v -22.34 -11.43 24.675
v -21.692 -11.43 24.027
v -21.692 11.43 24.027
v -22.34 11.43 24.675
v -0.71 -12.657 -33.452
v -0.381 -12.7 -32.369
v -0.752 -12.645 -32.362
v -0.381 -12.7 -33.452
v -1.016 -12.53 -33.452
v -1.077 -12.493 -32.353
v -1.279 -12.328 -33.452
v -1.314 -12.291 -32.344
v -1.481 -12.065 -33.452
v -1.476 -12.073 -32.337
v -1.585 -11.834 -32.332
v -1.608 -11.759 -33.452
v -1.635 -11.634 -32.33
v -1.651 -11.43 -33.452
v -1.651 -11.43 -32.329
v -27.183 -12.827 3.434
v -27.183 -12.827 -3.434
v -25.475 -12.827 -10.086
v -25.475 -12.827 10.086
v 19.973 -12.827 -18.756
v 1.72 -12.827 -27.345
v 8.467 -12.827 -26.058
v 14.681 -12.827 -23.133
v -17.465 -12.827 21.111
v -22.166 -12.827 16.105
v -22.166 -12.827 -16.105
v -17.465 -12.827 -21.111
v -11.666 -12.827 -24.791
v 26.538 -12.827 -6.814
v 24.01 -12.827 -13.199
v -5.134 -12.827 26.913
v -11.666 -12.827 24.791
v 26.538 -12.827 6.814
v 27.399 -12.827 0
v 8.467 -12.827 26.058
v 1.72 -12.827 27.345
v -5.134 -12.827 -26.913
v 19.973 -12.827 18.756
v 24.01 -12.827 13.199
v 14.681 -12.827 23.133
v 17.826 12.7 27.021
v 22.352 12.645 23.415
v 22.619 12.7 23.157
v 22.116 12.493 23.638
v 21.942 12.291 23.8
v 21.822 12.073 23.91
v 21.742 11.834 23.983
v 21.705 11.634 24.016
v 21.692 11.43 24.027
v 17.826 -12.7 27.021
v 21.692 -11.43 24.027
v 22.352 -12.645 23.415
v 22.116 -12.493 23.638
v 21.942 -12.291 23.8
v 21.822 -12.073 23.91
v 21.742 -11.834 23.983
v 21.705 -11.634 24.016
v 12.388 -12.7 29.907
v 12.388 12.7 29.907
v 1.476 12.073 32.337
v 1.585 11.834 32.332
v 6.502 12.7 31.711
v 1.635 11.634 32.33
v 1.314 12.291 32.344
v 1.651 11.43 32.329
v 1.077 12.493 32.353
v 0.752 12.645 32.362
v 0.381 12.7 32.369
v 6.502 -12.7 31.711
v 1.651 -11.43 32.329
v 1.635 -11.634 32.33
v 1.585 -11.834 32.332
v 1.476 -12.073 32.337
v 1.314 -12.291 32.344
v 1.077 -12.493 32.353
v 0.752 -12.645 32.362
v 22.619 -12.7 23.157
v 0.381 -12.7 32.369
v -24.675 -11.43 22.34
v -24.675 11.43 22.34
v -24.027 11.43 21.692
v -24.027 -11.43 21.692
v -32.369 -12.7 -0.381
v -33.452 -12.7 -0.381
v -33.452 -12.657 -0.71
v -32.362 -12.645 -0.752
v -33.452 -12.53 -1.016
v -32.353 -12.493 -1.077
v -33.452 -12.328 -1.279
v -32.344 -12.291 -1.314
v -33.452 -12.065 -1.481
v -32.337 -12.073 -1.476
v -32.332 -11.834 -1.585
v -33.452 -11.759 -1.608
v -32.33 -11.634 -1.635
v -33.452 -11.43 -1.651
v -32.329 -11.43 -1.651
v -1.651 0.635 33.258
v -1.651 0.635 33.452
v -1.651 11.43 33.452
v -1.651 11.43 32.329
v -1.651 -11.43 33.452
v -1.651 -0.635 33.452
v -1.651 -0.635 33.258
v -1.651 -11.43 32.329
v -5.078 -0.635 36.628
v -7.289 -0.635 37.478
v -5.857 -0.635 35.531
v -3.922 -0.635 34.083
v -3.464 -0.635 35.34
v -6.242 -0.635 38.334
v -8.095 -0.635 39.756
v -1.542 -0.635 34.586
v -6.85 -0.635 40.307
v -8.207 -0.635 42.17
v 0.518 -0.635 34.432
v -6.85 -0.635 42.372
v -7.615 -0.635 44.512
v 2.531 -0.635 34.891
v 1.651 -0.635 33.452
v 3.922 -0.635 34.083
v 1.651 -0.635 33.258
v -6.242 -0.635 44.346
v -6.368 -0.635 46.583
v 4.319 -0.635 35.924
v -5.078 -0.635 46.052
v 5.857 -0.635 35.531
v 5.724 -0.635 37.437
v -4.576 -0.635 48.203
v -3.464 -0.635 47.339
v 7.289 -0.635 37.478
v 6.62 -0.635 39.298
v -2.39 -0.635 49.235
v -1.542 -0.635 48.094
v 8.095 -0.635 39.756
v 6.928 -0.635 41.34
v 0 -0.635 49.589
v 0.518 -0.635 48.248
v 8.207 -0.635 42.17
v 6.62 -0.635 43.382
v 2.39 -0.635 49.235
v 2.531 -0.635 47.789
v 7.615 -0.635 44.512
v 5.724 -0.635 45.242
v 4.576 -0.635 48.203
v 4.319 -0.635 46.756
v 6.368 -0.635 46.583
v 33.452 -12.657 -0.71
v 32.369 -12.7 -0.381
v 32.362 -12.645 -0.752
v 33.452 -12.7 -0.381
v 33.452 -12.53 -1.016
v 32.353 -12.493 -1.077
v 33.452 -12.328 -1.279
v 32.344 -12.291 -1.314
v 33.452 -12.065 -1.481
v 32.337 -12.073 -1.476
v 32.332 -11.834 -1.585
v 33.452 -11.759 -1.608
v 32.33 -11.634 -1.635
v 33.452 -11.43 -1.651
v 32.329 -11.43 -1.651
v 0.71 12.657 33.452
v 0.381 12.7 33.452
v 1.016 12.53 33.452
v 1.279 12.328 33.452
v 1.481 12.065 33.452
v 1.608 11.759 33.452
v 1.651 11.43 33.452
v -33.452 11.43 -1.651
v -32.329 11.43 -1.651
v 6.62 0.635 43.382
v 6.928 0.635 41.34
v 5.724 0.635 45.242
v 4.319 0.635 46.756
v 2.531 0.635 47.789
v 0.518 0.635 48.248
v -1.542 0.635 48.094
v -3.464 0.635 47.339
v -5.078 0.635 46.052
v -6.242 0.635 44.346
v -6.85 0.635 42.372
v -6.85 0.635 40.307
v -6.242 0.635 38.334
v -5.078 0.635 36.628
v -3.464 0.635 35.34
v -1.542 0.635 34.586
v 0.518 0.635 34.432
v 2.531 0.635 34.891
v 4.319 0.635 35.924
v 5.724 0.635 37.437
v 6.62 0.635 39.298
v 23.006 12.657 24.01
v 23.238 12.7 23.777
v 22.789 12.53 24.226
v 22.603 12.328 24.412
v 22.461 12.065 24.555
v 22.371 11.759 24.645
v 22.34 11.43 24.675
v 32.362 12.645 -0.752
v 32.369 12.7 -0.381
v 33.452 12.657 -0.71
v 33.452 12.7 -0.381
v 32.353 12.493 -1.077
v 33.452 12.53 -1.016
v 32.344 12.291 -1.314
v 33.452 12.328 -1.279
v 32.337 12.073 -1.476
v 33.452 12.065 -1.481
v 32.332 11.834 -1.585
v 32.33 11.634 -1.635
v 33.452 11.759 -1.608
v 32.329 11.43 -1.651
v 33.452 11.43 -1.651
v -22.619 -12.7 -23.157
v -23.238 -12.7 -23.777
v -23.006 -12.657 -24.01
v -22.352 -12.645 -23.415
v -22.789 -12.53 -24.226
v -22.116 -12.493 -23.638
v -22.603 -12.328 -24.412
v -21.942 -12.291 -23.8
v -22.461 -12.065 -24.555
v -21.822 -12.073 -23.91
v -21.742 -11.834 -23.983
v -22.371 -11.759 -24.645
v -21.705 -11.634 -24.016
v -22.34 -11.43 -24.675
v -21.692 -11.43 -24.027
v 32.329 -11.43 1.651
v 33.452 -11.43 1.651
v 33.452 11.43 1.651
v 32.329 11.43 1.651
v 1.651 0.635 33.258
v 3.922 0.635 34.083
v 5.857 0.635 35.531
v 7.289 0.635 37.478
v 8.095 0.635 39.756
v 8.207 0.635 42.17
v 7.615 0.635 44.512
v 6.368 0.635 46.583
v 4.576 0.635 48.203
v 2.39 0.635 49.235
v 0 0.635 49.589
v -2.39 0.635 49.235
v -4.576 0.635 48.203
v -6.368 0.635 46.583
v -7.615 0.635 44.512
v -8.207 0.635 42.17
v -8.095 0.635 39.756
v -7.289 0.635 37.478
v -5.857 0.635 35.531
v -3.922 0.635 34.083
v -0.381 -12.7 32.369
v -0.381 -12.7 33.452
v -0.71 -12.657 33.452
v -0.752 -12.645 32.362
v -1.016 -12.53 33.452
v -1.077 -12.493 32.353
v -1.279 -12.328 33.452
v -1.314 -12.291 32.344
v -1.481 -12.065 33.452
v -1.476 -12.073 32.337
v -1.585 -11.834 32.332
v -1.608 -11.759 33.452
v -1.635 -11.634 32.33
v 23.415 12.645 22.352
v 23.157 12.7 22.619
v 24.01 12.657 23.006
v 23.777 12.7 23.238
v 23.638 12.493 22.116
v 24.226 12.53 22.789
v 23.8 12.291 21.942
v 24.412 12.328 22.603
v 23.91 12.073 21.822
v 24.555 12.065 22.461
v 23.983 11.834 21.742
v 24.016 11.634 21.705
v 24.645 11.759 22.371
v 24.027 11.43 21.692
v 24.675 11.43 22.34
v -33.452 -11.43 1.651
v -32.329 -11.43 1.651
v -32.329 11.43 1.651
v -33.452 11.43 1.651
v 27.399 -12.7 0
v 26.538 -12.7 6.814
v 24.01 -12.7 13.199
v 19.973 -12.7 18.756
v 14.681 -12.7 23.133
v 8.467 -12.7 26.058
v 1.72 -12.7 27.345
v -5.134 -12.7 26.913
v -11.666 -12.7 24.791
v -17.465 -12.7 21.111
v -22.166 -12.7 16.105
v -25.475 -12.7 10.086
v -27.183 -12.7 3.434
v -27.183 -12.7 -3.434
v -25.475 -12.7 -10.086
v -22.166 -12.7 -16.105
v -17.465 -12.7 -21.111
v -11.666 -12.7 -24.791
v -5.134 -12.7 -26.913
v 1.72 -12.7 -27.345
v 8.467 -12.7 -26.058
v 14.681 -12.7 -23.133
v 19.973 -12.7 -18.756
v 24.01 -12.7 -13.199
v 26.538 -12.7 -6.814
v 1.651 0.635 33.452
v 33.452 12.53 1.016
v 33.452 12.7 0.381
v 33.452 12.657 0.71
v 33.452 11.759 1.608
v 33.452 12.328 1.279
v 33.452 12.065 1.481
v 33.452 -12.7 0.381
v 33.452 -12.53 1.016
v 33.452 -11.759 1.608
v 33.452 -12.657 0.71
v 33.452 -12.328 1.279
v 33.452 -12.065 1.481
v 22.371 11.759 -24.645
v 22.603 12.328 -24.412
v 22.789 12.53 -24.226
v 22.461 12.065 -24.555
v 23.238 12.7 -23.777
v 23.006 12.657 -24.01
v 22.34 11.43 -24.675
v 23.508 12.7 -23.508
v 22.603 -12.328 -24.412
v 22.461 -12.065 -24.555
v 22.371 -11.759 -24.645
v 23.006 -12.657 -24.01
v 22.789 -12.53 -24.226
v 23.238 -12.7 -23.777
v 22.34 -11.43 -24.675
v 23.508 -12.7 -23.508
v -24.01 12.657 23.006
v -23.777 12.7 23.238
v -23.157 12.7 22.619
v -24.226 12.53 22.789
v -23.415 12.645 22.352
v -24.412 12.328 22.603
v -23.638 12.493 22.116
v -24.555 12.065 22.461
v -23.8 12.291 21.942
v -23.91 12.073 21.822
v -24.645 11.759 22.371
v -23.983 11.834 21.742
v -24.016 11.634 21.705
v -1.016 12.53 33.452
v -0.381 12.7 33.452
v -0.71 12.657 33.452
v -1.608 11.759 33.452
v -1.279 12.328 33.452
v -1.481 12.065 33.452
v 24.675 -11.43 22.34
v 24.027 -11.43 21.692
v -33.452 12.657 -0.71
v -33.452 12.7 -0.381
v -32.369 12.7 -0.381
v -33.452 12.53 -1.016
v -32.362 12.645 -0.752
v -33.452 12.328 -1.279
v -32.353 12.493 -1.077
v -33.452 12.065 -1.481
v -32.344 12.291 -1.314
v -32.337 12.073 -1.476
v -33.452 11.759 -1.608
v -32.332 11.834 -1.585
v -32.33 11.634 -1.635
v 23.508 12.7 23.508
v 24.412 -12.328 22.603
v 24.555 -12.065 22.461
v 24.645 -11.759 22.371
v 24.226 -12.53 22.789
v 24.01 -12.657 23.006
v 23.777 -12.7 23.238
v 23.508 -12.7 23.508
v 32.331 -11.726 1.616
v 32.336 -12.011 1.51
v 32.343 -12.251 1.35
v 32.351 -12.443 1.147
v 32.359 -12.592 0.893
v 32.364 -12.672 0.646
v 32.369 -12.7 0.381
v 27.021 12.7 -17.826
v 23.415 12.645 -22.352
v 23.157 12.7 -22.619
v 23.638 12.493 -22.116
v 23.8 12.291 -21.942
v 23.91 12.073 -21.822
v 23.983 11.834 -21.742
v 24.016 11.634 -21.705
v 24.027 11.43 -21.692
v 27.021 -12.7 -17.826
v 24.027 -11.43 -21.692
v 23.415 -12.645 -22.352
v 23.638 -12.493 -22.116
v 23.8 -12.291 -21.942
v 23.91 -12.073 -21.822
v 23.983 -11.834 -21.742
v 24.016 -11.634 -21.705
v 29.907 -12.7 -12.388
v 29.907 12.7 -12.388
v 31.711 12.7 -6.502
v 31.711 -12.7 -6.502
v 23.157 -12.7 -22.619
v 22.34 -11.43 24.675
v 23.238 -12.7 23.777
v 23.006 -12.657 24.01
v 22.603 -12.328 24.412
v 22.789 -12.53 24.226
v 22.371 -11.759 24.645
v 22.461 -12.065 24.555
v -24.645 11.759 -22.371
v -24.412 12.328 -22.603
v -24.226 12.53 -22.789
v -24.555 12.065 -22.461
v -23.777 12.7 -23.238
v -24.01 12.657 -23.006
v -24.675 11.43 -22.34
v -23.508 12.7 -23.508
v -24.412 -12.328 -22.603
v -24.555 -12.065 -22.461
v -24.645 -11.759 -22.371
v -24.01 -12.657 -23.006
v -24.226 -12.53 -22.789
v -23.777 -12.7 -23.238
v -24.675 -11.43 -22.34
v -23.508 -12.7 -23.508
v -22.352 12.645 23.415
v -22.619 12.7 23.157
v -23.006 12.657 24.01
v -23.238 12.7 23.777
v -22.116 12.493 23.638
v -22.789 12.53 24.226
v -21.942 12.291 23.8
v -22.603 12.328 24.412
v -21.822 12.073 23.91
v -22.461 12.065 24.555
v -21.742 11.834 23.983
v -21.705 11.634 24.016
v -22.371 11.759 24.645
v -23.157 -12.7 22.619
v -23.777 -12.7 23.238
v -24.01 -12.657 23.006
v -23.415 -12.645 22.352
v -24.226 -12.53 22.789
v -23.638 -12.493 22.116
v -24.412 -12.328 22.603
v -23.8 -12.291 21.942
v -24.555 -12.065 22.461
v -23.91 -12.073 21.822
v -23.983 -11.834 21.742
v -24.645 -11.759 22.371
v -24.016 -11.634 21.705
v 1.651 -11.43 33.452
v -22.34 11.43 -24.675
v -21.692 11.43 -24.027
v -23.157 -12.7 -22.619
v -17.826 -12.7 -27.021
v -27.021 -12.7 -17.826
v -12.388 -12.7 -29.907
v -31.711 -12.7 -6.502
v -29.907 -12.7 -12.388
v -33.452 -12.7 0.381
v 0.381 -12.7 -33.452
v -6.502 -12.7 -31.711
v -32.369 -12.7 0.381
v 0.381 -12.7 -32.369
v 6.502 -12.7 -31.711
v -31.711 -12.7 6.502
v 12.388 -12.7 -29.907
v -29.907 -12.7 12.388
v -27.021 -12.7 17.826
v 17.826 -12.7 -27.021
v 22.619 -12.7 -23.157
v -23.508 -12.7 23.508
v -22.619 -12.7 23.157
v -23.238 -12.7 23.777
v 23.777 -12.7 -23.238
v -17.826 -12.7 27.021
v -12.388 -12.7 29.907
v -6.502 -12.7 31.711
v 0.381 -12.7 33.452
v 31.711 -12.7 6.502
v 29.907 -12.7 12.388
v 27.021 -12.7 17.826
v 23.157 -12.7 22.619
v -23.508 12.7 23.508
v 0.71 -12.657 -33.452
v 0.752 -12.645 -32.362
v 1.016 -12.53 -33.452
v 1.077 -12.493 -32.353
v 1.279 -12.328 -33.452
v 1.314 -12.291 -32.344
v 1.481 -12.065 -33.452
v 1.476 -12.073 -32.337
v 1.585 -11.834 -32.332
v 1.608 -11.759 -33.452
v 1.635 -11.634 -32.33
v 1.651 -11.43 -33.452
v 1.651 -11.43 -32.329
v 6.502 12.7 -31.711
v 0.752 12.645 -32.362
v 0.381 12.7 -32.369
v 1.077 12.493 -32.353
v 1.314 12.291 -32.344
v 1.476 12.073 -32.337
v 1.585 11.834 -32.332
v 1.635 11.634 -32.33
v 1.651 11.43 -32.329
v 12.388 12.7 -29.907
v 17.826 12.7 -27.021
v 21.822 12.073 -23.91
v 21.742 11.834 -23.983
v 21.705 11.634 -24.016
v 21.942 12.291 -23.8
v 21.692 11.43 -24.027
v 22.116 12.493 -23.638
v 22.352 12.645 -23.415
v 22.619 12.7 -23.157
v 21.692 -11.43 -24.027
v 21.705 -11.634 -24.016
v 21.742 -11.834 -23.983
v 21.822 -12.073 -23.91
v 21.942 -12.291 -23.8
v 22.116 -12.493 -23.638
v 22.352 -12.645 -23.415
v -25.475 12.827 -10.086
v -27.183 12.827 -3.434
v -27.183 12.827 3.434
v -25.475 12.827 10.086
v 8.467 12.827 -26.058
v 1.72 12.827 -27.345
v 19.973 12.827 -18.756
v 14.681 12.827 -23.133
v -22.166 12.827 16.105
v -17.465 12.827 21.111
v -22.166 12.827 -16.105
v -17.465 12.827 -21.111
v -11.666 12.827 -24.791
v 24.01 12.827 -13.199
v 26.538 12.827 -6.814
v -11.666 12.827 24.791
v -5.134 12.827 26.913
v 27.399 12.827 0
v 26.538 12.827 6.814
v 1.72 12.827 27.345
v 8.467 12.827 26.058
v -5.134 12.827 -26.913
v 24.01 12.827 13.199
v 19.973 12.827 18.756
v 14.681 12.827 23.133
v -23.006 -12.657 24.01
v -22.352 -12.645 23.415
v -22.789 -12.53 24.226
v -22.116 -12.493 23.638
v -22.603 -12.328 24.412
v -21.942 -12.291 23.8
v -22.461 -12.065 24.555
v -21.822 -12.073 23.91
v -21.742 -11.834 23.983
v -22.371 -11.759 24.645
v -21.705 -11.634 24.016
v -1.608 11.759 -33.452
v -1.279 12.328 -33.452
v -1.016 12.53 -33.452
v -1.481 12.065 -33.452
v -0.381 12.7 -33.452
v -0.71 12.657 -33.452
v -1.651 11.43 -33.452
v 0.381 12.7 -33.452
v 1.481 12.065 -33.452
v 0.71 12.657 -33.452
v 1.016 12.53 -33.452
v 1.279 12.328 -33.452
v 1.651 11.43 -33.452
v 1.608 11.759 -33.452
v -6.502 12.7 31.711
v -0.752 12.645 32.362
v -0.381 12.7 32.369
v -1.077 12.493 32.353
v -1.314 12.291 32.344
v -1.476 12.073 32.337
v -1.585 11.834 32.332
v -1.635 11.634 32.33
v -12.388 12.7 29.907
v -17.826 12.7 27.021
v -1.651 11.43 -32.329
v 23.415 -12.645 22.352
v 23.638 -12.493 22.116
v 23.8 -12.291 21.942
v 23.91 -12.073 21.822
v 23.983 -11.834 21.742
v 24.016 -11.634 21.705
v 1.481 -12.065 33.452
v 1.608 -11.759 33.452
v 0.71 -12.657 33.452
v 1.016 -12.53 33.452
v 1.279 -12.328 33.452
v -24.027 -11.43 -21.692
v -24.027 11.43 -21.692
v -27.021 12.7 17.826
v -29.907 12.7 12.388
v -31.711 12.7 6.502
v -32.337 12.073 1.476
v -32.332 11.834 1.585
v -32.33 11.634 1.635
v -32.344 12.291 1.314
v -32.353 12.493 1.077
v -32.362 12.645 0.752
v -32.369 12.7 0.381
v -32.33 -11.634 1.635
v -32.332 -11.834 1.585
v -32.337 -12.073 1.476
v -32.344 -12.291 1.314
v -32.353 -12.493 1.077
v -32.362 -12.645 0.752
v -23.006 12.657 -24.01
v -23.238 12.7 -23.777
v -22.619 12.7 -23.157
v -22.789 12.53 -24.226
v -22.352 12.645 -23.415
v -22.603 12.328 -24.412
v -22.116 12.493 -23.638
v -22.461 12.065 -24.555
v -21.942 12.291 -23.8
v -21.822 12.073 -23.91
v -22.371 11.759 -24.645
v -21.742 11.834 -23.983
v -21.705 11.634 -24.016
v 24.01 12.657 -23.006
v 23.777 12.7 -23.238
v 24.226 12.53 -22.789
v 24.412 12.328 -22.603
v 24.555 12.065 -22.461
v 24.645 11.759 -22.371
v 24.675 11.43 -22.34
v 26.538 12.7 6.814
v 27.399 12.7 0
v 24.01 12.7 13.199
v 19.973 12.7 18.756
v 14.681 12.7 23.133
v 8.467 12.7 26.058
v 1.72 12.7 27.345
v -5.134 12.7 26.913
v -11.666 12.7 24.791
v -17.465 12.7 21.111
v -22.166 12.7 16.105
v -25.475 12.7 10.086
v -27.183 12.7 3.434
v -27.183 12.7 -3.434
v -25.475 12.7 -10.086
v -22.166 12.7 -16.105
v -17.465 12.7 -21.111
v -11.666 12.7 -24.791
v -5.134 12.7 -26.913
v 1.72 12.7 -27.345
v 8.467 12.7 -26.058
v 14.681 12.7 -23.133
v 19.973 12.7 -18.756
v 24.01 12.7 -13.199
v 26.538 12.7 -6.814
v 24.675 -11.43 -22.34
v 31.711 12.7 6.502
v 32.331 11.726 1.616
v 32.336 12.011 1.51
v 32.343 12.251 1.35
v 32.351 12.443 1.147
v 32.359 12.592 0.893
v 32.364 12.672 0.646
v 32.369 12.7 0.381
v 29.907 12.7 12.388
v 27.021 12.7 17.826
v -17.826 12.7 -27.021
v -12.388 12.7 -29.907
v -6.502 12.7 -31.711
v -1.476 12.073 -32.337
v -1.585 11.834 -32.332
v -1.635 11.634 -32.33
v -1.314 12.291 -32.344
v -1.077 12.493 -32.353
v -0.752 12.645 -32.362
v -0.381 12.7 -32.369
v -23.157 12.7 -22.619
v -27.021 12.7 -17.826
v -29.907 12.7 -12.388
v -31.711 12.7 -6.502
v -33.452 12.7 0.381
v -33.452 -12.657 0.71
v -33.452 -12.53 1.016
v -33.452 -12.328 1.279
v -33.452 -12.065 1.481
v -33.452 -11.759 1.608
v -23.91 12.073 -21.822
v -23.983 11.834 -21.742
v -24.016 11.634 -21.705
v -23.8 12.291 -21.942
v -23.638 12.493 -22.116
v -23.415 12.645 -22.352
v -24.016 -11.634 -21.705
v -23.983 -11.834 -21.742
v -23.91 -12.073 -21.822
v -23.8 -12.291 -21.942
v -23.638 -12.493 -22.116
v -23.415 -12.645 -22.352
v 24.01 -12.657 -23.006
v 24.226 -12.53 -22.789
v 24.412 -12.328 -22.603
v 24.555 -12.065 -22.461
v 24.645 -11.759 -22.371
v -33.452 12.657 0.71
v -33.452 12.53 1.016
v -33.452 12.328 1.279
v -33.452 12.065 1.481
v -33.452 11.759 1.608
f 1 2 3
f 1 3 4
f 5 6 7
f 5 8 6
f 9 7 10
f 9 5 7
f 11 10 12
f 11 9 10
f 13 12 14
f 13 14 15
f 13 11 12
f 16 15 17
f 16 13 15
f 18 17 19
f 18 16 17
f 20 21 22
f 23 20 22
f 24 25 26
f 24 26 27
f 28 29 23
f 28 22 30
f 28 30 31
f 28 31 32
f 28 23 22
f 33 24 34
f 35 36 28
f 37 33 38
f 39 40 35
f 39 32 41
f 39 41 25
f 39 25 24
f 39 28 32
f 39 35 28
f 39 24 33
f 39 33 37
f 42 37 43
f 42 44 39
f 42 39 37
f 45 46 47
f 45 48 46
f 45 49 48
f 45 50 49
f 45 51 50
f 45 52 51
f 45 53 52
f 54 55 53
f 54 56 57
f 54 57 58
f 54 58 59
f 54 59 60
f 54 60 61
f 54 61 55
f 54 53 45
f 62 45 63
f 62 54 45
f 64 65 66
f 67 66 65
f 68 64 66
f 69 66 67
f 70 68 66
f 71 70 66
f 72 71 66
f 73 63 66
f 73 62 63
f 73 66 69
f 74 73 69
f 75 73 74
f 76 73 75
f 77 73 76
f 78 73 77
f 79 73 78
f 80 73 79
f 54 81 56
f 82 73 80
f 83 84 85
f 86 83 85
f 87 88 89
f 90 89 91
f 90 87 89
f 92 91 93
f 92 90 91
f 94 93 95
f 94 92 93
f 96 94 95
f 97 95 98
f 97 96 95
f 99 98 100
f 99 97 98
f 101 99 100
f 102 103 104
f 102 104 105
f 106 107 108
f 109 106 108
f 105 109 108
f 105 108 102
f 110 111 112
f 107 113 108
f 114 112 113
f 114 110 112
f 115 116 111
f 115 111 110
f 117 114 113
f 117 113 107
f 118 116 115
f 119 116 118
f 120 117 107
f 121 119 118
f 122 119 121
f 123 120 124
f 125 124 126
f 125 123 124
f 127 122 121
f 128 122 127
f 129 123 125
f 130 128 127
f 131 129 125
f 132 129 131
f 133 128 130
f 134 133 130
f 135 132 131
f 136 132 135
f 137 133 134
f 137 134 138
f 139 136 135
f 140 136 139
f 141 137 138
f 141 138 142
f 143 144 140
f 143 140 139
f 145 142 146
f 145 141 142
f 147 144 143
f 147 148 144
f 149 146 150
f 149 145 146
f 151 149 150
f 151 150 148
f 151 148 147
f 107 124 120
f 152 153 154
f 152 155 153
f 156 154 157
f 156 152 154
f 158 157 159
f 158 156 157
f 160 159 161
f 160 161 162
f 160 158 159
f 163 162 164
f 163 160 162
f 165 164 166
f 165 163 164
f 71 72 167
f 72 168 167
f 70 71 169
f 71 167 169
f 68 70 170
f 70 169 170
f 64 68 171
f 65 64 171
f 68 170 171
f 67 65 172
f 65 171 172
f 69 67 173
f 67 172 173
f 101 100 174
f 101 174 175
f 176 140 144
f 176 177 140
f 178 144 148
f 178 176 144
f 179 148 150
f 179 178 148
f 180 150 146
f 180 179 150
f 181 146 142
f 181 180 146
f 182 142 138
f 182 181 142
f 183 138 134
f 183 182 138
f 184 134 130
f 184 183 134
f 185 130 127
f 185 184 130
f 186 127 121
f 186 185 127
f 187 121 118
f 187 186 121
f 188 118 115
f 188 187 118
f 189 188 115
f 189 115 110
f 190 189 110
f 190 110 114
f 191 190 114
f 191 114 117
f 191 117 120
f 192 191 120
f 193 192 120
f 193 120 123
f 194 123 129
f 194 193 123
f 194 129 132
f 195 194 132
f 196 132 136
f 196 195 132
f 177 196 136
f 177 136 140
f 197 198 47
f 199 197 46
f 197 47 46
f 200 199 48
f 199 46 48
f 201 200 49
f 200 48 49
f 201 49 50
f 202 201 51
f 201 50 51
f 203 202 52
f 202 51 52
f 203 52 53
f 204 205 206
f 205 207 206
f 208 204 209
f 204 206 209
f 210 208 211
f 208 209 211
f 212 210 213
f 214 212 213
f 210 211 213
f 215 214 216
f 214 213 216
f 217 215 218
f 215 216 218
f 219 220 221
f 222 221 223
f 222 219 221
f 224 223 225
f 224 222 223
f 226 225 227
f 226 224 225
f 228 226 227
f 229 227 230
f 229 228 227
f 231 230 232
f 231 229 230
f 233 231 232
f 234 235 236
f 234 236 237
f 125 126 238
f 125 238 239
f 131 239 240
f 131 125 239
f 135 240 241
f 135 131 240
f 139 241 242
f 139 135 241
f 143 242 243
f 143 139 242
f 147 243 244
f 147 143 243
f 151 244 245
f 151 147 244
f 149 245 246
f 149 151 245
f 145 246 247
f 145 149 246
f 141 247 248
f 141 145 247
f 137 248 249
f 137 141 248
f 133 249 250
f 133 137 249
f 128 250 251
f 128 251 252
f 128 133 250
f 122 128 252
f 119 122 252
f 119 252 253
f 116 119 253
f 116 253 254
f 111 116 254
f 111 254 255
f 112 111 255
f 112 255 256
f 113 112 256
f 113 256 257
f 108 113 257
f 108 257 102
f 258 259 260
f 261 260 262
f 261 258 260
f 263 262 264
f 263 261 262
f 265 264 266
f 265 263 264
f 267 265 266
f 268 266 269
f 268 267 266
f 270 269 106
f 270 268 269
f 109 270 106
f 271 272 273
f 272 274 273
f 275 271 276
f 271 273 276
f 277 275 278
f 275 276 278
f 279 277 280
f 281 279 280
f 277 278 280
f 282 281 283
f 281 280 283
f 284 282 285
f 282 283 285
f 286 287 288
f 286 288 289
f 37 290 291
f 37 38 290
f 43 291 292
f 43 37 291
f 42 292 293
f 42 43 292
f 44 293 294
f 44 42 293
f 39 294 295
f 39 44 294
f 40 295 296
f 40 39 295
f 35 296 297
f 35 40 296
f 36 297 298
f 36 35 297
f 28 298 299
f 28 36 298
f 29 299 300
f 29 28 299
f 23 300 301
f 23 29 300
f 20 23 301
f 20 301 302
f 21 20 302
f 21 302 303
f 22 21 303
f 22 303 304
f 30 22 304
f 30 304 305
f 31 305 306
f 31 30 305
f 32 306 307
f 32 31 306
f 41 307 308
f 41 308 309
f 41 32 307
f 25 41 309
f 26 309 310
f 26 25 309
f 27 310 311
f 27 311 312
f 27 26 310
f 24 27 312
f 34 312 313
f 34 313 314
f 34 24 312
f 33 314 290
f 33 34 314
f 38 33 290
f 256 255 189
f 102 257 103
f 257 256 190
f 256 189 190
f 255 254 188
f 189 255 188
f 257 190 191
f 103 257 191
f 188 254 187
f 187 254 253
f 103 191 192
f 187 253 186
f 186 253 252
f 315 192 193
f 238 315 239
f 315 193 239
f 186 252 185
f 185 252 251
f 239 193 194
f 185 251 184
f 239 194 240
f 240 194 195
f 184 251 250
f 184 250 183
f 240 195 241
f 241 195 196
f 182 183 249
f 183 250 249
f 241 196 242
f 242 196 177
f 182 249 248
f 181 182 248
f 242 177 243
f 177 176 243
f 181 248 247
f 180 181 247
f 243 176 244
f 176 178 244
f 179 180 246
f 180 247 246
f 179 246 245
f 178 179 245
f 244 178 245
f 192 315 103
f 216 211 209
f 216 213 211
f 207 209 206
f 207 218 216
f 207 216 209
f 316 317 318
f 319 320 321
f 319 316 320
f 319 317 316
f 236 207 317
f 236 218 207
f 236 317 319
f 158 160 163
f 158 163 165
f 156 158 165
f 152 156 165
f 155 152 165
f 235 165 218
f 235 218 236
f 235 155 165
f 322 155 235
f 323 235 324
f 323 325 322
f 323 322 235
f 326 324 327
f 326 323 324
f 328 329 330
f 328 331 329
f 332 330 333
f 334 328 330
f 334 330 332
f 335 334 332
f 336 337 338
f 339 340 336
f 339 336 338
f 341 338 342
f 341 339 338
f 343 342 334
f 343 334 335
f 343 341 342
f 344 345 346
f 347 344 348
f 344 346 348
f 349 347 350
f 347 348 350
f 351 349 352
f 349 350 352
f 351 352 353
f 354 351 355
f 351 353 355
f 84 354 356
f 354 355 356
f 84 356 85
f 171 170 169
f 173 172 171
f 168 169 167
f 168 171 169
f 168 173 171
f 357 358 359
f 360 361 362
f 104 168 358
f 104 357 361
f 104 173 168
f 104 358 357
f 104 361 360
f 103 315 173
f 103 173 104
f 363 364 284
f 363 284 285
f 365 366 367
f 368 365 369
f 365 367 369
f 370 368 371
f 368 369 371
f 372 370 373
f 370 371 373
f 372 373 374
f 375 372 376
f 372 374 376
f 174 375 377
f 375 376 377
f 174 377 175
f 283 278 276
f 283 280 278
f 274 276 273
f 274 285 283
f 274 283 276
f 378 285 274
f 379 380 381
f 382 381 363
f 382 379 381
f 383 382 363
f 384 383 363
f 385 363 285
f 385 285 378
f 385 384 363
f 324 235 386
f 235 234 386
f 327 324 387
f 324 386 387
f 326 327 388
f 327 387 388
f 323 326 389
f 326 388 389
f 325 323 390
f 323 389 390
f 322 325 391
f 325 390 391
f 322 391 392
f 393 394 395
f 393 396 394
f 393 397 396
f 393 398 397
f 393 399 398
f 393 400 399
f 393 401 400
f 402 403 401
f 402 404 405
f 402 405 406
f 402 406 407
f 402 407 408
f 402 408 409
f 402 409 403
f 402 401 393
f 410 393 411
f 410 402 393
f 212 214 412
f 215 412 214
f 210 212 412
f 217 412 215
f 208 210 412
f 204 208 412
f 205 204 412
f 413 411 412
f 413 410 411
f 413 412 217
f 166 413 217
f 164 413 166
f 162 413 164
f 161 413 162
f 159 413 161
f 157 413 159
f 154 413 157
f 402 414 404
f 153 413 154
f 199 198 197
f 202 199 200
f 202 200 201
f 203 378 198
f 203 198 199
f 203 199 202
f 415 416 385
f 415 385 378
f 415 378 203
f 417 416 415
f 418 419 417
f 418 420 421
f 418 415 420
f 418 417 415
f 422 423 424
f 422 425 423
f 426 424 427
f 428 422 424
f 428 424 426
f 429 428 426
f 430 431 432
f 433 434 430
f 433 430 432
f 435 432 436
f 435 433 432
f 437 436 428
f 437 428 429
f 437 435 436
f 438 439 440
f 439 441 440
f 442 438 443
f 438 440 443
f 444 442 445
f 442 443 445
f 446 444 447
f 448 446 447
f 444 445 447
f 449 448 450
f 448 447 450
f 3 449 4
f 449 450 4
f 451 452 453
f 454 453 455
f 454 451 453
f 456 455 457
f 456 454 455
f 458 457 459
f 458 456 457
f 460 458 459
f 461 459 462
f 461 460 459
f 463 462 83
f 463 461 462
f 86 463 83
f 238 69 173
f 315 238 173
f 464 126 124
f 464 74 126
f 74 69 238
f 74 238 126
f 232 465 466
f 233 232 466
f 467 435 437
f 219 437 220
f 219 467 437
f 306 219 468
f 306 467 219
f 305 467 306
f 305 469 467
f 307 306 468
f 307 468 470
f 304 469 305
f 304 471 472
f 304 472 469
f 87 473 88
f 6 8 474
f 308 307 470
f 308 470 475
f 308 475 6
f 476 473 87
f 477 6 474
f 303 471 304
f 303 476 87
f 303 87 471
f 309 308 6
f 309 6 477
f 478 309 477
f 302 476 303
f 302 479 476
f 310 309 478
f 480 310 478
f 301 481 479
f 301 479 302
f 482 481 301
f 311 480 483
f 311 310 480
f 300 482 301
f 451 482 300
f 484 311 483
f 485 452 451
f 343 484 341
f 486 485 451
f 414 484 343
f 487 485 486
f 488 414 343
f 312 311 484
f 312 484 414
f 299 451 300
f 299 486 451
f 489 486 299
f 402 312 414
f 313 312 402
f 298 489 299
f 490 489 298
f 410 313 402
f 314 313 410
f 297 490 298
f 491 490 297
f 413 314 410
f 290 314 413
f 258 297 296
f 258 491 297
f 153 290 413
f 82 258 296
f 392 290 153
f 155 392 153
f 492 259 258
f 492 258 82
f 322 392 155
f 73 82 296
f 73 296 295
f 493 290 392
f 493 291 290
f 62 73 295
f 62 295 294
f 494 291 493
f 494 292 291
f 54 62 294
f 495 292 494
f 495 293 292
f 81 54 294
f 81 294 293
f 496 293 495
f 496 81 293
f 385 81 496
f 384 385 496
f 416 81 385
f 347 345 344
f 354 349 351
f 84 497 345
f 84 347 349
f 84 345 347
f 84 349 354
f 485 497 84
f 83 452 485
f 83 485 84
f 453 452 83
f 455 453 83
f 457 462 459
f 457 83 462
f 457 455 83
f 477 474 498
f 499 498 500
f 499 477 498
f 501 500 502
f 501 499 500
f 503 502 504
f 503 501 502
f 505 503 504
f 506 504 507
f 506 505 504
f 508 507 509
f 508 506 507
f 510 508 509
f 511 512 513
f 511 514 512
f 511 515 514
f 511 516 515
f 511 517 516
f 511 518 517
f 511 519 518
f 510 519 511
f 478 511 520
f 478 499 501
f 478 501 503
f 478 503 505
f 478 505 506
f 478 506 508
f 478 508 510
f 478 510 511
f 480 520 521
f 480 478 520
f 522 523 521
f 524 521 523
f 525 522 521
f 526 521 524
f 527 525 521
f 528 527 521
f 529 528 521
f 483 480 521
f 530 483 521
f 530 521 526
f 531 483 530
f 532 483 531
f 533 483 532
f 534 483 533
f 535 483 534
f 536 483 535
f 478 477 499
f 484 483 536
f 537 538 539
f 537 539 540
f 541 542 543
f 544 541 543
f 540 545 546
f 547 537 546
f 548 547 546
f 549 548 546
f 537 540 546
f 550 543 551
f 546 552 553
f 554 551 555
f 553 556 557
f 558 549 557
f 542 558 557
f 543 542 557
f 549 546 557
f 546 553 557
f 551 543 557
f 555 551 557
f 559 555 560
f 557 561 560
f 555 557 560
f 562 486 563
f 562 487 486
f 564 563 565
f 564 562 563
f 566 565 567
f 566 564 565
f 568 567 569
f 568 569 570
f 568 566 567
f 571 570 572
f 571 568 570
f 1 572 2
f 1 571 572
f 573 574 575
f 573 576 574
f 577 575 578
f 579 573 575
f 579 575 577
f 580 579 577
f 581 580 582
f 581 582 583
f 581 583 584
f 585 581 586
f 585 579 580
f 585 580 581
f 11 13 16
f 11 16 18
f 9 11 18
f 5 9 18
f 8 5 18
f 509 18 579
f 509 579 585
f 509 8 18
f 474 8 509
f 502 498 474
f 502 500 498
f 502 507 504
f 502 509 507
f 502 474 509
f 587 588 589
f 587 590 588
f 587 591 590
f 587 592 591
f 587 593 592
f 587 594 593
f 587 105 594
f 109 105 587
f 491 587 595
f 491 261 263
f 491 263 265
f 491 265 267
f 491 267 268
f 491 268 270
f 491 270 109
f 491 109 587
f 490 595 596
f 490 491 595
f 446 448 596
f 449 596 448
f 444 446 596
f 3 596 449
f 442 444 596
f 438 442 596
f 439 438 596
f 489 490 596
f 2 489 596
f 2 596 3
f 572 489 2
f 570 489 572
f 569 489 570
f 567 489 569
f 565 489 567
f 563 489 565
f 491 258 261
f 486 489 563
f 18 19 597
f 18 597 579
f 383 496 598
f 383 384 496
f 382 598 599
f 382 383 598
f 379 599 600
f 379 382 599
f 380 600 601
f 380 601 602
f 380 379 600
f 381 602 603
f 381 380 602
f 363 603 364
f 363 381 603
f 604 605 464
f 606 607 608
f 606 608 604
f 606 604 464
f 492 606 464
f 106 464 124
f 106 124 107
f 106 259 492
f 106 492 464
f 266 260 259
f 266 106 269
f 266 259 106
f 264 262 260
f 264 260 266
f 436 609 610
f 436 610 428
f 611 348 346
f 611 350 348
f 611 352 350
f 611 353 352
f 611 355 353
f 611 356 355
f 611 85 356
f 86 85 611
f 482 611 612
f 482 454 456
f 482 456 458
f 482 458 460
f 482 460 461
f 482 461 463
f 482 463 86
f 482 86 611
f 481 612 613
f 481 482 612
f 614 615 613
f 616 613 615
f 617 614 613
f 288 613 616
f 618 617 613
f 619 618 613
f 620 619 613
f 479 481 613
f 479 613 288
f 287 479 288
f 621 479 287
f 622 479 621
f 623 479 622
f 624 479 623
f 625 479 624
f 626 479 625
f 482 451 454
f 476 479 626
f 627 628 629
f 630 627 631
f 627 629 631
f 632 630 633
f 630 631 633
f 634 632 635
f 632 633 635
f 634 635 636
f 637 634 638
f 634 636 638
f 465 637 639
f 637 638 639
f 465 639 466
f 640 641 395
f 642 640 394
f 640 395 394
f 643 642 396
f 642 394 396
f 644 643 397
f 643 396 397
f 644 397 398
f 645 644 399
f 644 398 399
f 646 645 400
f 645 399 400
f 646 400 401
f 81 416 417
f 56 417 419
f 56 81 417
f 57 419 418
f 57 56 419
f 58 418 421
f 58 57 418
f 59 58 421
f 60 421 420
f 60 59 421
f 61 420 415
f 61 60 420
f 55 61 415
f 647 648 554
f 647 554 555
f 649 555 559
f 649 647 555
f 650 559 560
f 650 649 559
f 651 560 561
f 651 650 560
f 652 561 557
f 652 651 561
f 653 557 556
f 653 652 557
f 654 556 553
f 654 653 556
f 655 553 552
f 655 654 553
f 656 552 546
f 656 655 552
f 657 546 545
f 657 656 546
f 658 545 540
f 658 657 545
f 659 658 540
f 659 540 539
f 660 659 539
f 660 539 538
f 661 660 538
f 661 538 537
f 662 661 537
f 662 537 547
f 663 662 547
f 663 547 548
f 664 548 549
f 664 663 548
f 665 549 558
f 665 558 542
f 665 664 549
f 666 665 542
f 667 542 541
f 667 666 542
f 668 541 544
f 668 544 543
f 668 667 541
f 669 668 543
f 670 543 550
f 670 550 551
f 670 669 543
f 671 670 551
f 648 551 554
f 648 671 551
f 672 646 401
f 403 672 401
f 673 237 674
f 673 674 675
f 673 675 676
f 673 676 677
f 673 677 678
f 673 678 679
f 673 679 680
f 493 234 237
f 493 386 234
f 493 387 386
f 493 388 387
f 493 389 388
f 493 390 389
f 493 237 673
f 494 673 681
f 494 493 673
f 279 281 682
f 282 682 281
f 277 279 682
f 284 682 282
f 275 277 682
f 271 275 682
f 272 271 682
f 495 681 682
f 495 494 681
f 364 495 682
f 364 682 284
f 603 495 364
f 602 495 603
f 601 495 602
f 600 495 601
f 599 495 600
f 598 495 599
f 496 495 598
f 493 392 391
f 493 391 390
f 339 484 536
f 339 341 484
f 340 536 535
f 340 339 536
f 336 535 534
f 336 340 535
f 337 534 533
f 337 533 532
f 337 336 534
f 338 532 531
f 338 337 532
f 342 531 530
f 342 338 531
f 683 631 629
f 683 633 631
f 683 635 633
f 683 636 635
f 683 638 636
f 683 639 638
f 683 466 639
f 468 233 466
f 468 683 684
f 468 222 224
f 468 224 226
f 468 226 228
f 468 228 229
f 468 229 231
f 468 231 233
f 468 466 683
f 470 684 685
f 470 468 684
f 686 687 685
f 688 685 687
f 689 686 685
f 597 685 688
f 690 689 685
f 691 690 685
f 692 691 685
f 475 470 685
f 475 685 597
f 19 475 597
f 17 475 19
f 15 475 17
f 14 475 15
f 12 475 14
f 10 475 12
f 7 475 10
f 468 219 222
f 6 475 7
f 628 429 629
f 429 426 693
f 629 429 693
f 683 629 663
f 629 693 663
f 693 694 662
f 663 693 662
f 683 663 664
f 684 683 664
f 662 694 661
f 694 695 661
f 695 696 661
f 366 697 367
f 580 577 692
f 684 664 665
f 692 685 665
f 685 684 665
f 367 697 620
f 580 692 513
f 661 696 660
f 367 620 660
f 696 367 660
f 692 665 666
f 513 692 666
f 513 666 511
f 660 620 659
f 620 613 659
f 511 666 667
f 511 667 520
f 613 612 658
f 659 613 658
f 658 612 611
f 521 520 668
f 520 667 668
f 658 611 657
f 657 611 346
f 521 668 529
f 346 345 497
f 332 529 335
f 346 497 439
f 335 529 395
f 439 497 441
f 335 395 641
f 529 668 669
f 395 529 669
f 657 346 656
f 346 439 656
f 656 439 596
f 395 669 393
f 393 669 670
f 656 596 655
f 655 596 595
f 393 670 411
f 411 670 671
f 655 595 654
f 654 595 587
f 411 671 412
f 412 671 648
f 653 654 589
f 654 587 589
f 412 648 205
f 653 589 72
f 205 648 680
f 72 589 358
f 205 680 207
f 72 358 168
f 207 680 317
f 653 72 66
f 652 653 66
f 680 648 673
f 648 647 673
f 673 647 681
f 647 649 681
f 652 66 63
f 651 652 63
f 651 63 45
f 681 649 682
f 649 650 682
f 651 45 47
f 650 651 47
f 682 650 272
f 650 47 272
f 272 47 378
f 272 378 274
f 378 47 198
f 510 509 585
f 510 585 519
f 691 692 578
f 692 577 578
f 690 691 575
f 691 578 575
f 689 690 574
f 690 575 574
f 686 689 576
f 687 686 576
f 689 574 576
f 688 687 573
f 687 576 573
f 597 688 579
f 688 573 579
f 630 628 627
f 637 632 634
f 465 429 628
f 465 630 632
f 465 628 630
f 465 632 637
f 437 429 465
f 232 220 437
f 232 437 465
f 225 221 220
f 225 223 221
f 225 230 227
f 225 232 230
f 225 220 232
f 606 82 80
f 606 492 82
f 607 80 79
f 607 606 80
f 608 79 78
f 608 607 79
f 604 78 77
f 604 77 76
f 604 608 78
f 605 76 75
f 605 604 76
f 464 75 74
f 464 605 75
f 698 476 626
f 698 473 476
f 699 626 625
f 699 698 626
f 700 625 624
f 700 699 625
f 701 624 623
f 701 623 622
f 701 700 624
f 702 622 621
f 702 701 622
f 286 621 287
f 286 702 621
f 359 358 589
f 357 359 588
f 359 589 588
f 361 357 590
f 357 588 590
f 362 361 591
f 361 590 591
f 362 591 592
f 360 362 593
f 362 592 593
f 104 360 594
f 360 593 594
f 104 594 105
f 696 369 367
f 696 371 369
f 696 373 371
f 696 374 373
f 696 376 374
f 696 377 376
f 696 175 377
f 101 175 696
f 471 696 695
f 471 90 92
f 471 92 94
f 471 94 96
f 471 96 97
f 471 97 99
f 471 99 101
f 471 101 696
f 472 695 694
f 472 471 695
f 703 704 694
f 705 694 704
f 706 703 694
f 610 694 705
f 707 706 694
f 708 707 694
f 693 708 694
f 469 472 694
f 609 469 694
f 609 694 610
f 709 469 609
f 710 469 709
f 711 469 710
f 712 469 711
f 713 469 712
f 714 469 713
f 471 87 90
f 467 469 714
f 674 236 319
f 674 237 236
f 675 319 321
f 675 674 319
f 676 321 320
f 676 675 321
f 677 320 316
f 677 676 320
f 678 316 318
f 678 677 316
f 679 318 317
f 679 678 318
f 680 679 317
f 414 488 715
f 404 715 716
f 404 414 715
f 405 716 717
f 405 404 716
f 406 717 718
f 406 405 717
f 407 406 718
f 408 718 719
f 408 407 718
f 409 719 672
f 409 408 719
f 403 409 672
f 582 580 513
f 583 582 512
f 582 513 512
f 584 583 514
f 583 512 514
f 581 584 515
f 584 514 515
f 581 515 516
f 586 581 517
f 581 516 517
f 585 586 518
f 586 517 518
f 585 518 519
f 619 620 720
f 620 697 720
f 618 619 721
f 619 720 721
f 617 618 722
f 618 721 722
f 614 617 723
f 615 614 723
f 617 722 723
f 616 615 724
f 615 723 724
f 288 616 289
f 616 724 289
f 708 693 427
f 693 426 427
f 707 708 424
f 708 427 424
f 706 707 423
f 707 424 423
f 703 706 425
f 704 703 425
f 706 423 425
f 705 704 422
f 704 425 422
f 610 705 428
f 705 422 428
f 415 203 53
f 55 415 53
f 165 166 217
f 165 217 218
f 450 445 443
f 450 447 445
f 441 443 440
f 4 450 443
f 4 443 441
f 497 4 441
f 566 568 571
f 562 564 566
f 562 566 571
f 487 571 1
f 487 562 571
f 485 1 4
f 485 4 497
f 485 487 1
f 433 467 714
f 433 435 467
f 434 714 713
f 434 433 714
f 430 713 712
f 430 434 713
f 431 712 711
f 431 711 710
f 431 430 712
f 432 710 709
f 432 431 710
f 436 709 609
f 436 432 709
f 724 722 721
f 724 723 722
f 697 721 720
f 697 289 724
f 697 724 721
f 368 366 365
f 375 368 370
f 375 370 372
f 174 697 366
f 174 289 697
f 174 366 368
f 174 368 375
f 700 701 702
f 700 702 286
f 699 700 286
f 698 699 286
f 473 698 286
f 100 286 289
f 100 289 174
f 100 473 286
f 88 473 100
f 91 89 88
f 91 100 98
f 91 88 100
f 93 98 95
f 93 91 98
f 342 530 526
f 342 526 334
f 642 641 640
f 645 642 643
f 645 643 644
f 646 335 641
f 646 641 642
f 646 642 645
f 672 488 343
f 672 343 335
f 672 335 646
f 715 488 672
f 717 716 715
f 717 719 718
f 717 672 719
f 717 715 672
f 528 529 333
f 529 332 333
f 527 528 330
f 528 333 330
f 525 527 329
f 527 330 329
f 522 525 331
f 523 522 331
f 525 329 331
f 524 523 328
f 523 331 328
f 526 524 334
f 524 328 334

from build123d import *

# Parameters (mm, degrees)
F0_R     = 32.3708711279
F1_DEPTH = 12.7
F2_R     = 27.3986132433
F3_DEPTH = 12.827
F5_DEPTH = 25.4
F6_R     = 1.27
F8_R     = 8.2490124286
F8_R_2   = 6.9276952265
F9_DEPTH = 0.635


# Not quite as in the source:
# - two fillets or chamfers of one size are made in one step


with BuildPart() as f1:
    # F0 (on Front) → F1 (new body, symmetric)
    with BuildSketch(Plane.XZ):
        Circle(F0_R)
    extrude(amount=F1_DEPTH, both=True)

    # F2 (on Front) → F3 (join, symmetric)
    with BuildSketch(Plane.XZ):
        Circle(F2_R)
    extrude(amount=F3_DEPTH, both=True)

    # F4 (on face) → F5 (join)
    with BuildSketch(Plane.XZ.offset(12.7)):
        with BuildLine():
            ThreePointArc((-24.0273053052, 21.6924387138), (-22.8896624875, 22.8896624875), (-21.6924387138, 24.0273053052))
            Line((-21.6924387138, 24.0273053052), (-22.3403787647, 24.6752453562))
            Line((-22.3403787647, 24.6752453562), (-23.5078120604, 23.5078120604))
            Line((-23.5078120604, 23.5078120604), (-24.6752453562, 22.3403787647))
            Line((-24.6752453562, 22.3403787647), (-24.0273053052, 21.6924387138))
        make_face()
        with BuildLine():
            Line((24.6752453562, 22.3403787647), (23.5078120604, 23.5078120604))
            Line((23.5078120604, 23.5078120604), (22.3403787647, 24.6752453562))
            Line((22.3403787647, 24.6752453562), (21.6924387138, 24.0273053052))
            ThreePointArc((21.6924387138, 24.0273053052), (22.8896624875, 22.8896624875), (24.0273053052, 21.6924387138))
            Line((24.0273053052, 21.6924387138), (24.6752453562, 22.3403787647))
        make_face()
        with BuildLine():
            Line((24.6752453562, -22.3403787647), (24.0273053052, -21.6924387138))
            ThreePointArc((24.0273053052, -21.6924387138), (22.8896624875, -22.8896624875), (21.6924387138, -24.0273053052))
            Line((21.6924387138, -24.0273053052), (22.3403787647, -24.6752453562))
            Line((22.3403787647, -24.6752453562), (23.5078120604, -23.5078120604))
            Line((23.5078120604, -23.5078120604), (24.6752453562, -22.3403787647))
        make_face()
        with BuildLine():
            ThreePointArc((-21.6924387138, -24.0273053052), (-22.8896624875, -22.8896624875), (-24.0273053052, -21.6924387138))
            Line((-24.0273053052, -21.6924387138), (-24.6752453562, -22.3403787647))
            Line((-24.6752453562, -22.3403787647), (-23.5078120604, -23.5078120604))
            Line((-23.5078120604, -23.5078120604), (-22.3403787647, -24.6752453562))
            Line((-22.3403787647, -24.6752453562), (-21.6924387138, -24.0273053052))
        make_face()
        with BuildLine():
            Line((1.651, -33.4515422583), (1.651, -32.3287410299))
            ThreePointArc((1.651, -32.3287410299), (0, -32.3708711279), (-1.651, -32.3287410299))
            Line((-1.651, -32.3287410299), (-1.651, -33.4515422583))
            Line((-1.651, -33.4515422583), (0, -33.4515422583))
            Line((0, -33.4515422583), (1.651, -33.4515422583))
        make_face()
        with BuildLine():
            ThreePointArc((-32.3287410299, -1.651), (-32.3708711279, 0), (-32.3287410299, 1.651))
            Line((-32.3287410299, 1.651), (-33.4515480299, 1.651))
            Line((-33.4515480299, 1.651), (-33.4515480299, 0))
            Line((-33.4515480299, 0), (-33.4515480299, -1.651))
            Line((-33.4515480299, -1.651), (-32.3287410299, -1.651))
        make_face()
        with BuildLine():
            Line((33.4515480299, 1.651), (32.3287410299, 1.651))
            ThreePointArc((32.3287410299, 1.651), (32.3603368894, 0.8257687245), (32.3708711279, 0))
            ThreePointArc((32.3708711279, 0), (32.3603368894, -0.8257687245), (32.3287410299, -1.651))
            Line((32.3287410299, -1.651), (33.4515480299, -1.651))
            Line((33.4515480299, -1.651), (33.4515480299, 0))
            Line((33.4515480299, 0), (33.4515480299, 1.651))
        make_face()
        with BuildLine():
            ThreePointArc((-1.651, 32.3287410299), (0, 32.3708711279), (1.651, 32.3287410299))
            Line((1.651, 32.3287410299), (1.651, 33.4515422583))
            Line((1.651, 33.4515422583), (0, 33.4515422583))
            Line((0, 33.4515422583), (-1.651, 33.4515422583))
            Line((-1.651, 33.4515422583), (-1.651, 32.3287410299))
        make_face()
    extrude(amount=-F5_DEPTH)

    # F6
    f6_edges = [f1.edges().sort_by_distance(p)[0] for p in [
        (24.351275, 12.7, -22.016409),
        (22.016409, 12.7, -24.351275),
        (24.351275, -12.7, -22.016409),
        (22.016409, -12.7, -24.351275),
        (24.351275, -12.7, 22.016409),
        (22.016409, -12.7, 24.351275),
        (22.016409, 12.7, 24.351275),
        (24.351275, 12.7, 22.016409),
        (-22.016409, 12.7, 24.351275),
        (-24.351275, 12.7, 22.016409),
        (-24.351275, 12.7, -22.016409),
        (-22.016409, 12.7, -24.351275),
        (-22.016409, -12.7, -24.351275),
        (-24.351275, -12.7, -22.016409),
        (-24.351275, -12.7, 22.016409),
        (-22.016409, -12.7, 24.351275),
        (32.890145, -12.7, 1.651),
        (32.890145, 12.7, 1.651),
        (1.651, -12.7, 32.890142),
        (-1.651, -12.7, 32.890142),
        (-32.890145, -12.7, 1.651),
        (-32.890145, -12.7, -1.651),
        (-1.651, -12.7, -32.890142),
        (1.651, -12.7, -32.890142),
        (32.890145, -12.7, -1.651),
        (1.651, 12.7, 32.890142),
        (-1.651, 12.7, 32.890142),
        (-32.890145, 12.7, 1.651),
        (-32.890145, 12.7, -1.651),
        (-1.651, 12.7, -32.890142),
        (1.651, 12.7, -32.890142),
        (32.890145, 12.7, -1.651),
    ]]
    fillet(f6_edges, radius=F6_R)

    # F8 (on Front) → F9 (join, symmetric)
    with BuildSketch(Plane.XZ):
        with Locations((0, 41.3398481905)):
            Circle(F8_R)
        with Locations((0, 41.3398481905)):
            Circle(F8_R_2, mode=Mode.SUBTRACT)
    extrude(amount=F9_DEPTH, both=True)


solid = f1.part
